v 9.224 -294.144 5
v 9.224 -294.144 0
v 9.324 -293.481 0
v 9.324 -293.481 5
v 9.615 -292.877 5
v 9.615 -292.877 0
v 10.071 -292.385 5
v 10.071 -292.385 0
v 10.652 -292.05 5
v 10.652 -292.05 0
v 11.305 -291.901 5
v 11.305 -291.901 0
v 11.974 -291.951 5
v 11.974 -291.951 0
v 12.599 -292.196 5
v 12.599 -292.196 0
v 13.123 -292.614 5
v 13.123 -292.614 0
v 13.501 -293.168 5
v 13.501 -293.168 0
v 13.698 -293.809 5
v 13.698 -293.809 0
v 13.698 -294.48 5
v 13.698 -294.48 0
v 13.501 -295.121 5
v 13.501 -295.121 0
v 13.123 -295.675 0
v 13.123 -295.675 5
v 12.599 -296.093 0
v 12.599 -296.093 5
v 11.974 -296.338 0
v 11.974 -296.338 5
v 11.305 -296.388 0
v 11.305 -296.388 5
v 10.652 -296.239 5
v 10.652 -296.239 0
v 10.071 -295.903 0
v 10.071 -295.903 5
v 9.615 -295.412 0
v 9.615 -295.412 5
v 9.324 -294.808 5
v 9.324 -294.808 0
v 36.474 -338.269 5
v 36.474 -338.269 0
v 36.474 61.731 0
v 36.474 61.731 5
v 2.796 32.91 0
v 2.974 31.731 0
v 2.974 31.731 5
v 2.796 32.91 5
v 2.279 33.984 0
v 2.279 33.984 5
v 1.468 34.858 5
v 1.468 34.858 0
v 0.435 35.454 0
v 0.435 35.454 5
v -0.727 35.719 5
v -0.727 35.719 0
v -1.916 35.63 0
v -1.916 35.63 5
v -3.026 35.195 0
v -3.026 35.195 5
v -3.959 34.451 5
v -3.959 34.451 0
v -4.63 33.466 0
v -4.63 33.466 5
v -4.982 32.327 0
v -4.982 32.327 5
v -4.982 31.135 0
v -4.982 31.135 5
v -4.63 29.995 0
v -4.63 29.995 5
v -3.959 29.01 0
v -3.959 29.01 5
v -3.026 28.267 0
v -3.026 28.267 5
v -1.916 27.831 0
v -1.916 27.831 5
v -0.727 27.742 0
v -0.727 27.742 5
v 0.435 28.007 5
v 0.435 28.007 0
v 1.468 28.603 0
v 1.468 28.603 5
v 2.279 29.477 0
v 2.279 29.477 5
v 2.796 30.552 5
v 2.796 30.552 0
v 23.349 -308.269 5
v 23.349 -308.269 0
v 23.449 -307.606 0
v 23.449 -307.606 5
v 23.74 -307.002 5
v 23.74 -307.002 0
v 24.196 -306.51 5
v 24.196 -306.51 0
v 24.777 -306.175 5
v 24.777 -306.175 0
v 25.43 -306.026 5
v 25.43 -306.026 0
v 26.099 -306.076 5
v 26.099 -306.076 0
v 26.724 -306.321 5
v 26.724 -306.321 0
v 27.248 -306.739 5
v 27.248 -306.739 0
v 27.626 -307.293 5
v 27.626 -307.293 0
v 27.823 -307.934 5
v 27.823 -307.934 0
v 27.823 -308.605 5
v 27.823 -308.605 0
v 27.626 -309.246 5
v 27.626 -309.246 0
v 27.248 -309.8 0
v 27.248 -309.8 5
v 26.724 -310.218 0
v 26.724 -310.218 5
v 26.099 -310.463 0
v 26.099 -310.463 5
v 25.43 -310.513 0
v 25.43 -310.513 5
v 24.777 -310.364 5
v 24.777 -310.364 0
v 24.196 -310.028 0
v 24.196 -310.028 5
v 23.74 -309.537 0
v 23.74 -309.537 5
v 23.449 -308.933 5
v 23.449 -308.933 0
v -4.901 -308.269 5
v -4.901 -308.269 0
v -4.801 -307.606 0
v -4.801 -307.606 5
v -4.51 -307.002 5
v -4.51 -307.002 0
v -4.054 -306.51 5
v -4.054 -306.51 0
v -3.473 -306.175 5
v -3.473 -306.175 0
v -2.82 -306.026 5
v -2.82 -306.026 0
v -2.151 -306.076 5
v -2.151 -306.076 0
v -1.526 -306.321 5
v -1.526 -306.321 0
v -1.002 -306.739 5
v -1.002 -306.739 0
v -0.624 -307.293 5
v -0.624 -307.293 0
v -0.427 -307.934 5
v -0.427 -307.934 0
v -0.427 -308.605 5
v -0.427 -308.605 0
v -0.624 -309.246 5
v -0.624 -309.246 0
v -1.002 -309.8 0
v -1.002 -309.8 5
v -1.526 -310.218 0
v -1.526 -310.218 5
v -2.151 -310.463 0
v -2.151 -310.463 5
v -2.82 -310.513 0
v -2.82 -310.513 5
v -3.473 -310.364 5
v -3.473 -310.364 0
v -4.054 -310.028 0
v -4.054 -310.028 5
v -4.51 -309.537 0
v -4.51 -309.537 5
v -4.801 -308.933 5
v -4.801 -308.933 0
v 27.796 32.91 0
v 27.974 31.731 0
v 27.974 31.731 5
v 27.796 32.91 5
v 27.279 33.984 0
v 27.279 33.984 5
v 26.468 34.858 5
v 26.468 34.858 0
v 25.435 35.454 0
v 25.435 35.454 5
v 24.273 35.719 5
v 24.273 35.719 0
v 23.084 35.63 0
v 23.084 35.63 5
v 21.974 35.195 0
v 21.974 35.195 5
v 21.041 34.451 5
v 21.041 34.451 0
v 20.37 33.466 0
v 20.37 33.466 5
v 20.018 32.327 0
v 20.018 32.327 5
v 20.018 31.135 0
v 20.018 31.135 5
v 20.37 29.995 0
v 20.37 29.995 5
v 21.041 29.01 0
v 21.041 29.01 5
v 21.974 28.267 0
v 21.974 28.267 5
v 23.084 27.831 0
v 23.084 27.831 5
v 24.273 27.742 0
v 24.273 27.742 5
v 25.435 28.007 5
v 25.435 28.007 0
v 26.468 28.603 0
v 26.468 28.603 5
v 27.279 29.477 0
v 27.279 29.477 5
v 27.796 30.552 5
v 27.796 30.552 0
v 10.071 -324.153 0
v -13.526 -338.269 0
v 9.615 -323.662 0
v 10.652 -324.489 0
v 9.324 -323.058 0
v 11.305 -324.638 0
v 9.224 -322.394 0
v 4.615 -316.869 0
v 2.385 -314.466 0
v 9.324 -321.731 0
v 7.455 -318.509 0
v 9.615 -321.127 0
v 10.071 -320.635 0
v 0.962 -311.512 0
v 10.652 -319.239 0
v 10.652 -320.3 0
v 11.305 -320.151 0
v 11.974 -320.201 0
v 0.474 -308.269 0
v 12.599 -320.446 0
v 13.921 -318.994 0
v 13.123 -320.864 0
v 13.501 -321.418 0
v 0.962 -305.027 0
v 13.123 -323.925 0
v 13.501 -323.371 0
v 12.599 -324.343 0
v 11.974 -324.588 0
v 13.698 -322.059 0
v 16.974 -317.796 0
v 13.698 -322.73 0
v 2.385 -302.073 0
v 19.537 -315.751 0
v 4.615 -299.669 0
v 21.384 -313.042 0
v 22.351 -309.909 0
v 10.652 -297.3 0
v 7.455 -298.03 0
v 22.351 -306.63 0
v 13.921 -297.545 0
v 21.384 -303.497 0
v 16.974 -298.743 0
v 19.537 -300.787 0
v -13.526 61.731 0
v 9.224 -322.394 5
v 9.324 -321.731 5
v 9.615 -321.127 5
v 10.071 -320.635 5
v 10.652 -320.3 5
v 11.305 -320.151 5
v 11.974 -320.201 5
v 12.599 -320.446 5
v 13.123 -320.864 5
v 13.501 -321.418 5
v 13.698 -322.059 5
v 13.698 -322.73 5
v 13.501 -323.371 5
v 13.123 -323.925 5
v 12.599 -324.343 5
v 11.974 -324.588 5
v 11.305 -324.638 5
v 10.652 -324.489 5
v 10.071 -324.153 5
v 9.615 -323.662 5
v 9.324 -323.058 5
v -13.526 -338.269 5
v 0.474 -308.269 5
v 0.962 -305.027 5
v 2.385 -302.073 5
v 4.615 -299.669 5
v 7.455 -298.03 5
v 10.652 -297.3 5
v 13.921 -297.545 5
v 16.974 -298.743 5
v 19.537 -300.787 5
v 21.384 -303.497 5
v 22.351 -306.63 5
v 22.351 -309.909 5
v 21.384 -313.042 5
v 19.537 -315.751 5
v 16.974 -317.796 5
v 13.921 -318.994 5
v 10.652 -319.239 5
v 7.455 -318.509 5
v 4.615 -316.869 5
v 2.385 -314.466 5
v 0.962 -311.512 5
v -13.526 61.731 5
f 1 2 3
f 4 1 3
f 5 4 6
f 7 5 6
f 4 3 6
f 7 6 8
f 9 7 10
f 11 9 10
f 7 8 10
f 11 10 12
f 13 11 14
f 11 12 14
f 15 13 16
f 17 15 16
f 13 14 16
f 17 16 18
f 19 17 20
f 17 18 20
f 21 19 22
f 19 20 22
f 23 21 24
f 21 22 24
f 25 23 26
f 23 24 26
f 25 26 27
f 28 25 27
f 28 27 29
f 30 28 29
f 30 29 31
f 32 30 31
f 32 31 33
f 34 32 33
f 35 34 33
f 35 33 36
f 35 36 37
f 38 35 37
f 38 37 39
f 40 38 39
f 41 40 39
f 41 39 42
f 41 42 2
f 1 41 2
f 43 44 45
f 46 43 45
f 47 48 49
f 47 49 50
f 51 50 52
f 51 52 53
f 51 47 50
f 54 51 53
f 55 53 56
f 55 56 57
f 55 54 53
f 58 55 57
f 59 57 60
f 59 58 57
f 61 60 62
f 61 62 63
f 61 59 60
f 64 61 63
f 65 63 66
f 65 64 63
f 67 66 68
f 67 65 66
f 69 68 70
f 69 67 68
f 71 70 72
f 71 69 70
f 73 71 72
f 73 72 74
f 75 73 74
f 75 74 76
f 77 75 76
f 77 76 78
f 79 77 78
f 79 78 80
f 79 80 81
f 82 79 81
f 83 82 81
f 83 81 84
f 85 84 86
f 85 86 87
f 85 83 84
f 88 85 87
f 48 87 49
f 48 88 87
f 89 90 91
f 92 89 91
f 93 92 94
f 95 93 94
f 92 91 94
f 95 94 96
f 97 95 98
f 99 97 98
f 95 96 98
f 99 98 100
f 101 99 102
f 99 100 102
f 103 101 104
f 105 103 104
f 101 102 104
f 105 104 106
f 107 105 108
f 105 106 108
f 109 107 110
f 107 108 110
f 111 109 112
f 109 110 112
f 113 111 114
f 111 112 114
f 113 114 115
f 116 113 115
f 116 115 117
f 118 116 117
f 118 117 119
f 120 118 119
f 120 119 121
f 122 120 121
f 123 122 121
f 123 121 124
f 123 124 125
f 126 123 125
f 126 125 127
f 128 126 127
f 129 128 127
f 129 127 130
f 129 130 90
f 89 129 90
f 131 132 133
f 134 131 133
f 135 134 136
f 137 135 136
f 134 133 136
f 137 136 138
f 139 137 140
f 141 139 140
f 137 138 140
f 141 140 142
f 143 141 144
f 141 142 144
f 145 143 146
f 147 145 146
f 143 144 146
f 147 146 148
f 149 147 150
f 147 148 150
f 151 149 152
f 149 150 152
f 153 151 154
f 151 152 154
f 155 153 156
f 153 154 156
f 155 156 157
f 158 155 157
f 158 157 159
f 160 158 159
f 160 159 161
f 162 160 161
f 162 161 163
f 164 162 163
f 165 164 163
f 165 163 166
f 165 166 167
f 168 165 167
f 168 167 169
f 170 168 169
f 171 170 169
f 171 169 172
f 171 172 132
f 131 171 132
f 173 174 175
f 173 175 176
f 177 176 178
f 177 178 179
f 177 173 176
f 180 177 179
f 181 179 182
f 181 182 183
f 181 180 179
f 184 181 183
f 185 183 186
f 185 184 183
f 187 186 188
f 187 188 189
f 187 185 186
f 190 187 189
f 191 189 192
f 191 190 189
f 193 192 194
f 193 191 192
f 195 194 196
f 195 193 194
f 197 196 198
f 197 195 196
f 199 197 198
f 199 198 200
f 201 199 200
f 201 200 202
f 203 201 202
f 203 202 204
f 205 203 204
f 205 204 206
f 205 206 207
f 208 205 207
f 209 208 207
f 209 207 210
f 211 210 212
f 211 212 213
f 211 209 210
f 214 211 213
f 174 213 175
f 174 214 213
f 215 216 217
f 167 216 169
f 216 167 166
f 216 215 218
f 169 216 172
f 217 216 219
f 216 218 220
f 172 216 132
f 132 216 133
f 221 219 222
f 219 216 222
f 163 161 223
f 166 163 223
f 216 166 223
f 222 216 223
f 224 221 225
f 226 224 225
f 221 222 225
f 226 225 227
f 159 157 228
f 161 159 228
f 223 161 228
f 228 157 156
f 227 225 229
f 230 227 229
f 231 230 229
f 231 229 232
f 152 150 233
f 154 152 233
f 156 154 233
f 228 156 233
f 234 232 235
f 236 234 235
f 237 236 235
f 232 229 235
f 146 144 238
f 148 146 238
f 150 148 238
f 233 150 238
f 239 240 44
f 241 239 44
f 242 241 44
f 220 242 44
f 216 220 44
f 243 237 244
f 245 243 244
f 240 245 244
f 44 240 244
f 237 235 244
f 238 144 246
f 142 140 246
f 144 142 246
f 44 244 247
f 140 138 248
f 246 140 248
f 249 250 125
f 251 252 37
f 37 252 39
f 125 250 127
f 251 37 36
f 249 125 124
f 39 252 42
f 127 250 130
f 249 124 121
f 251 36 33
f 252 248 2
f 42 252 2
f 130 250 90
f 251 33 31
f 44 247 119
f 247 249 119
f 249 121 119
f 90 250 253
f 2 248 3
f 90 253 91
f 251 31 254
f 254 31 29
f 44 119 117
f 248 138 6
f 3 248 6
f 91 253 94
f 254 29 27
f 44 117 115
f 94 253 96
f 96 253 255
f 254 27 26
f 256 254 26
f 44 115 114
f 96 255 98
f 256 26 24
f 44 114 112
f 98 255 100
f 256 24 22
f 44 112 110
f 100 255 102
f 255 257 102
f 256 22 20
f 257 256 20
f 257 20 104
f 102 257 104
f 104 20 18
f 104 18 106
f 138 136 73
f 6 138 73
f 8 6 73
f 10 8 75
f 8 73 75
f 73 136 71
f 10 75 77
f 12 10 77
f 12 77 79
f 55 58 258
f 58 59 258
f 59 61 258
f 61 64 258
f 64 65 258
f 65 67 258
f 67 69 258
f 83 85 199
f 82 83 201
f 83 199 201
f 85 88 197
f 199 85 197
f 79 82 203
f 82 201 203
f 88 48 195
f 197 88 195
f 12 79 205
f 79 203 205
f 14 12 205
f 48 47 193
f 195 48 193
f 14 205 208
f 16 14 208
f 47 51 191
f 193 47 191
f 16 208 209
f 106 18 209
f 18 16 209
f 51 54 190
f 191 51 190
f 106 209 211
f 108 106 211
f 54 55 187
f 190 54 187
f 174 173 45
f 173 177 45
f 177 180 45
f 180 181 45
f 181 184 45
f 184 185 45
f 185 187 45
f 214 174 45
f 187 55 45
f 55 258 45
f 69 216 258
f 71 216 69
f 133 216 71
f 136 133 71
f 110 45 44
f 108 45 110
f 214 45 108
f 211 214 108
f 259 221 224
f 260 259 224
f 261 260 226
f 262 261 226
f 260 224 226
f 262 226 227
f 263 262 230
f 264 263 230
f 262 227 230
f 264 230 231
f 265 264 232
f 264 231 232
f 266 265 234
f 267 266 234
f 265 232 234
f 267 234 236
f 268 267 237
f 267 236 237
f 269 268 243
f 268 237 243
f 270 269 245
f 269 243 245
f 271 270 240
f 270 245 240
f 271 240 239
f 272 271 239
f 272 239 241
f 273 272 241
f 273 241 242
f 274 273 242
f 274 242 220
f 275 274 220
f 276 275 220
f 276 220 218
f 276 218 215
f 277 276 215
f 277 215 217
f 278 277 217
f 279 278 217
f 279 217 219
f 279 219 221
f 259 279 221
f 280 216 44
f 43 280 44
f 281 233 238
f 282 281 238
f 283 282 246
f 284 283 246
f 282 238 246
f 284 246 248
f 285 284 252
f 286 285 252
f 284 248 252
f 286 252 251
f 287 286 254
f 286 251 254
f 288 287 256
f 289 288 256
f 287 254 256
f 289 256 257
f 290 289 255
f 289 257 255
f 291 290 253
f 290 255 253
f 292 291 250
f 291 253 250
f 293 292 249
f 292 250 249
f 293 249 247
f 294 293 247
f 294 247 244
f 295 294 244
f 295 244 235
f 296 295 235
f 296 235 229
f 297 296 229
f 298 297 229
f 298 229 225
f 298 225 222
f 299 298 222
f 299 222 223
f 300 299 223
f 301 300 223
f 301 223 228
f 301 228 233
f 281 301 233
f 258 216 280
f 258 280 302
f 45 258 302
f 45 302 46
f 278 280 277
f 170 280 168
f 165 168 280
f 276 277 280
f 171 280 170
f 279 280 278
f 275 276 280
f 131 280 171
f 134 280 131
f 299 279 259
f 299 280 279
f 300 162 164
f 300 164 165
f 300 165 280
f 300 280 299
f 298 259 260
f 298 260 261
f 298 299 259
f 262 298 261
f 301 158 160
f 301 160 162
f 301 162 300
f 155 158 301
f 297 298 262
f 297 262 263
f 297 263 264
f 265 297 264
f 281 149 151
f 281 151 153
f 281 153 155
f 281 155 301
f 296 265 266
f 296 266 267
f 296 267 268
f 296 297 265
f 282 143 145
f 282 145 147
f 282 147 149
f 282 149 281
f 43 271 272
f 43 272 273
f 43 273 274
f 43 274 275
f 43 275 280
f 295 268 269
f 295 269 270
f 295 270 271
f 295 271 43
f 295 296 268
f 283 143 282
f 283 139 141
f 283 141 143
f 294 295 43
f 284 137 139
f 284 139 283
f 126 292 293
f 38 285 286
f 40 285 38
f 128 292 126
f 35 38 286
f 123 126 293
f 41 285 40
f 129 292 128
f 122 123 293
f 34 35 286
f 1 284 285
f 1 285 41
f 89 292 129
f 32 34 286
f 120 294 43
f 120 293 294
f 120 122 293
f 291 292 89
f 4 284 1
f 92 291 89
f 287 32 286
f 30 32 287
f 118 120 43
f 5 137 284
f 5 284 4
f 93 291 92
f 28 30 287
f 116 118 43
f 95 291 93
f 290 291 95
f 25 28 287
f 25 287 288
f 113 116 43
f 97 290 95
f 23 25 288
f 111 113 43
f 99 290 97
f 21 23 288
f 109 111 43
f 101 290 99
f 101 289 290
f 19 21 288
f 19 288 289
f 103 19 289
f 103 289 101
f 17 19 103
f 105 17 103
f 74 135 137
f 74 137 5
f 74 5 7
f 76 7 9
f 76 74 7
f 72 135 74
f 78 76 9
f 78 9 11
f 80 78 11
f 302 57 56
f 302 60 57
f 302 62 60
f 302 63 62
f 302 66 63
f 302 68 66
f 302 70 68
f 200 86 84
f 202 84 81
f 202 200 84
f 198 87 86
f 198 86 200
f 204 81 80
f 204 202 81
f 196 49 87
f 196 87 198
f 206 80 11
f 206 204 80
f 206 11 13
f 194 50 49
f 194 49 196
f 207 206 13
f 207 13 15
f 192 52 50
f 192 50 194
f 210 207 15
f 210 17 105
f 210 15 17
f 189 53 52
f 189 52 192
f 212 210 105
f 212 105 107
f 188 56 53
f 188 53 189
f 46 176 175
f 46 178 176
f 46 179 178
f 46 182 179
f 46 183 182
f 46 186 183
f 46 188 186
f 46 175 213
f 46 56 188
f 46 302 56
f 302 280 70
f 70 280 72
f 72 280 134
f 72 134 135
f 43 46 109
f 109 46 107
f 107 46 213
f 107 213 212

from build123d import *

# Parameters (mm, degrees)
SKETCH1_W           = 50
SKETCH1_H           = 400
SKETCH1_R           = 4
BOSS_EXTRUDE1_DEPTH = 5
SKETCH2_R           = 2.25
SKETCH2_R_2         = 11
CUT_EXTRUDE1_DEPTH  = 10


with BuildPart() as part:
    # Sketch1 → Boss-Extrude1 (new body)
    with BuildSketch(Plane.XY):
        with Locations((11.473600575, -138.26932293)):
            Rectangle(SKETCH1_W, SKETCH1_H)
        with Locations((-1.026399425, 31.73067707)):
            Circle(SKETCH1_R, mode=Mode.SUBTRACT)
        with Locations((23.973600575, 31.73067707)):
            Circle(SKETCH1_R, mode=Mode.SUBTRACT)
    extrude(amount=BOSS_EXTRUDE1_DEPTH)

    # Sketch2 → Cut-Extrude1 (cut)
    with BuildSketch(Plane(origin=(0, 0, 0), x_dir=(-1, 0, 0), z_dir=(0, 0, -1))):
        with Locations((-11.473600575, -322.39432293)):
            Circle(SKETCH2_R)
        with Locations((2.651399425, -308.26932293)):
            Circle(SKETCH2_R)
        with Locations((-11.473600575, -294.14432293)):
            Circle(SKETCH2_R)
        with Locations((-25.598600575, -308.26932293)):
            Circle(SKETCH2_R)
        with Locations((-11.473600575, -308.26932293)):
            Circle(SKETCH2_R_2)
    extrude(amount=-CUT_EXTRUDE1_DEPTH, mode=Mode.SUBTRACT)


solid = part.part
